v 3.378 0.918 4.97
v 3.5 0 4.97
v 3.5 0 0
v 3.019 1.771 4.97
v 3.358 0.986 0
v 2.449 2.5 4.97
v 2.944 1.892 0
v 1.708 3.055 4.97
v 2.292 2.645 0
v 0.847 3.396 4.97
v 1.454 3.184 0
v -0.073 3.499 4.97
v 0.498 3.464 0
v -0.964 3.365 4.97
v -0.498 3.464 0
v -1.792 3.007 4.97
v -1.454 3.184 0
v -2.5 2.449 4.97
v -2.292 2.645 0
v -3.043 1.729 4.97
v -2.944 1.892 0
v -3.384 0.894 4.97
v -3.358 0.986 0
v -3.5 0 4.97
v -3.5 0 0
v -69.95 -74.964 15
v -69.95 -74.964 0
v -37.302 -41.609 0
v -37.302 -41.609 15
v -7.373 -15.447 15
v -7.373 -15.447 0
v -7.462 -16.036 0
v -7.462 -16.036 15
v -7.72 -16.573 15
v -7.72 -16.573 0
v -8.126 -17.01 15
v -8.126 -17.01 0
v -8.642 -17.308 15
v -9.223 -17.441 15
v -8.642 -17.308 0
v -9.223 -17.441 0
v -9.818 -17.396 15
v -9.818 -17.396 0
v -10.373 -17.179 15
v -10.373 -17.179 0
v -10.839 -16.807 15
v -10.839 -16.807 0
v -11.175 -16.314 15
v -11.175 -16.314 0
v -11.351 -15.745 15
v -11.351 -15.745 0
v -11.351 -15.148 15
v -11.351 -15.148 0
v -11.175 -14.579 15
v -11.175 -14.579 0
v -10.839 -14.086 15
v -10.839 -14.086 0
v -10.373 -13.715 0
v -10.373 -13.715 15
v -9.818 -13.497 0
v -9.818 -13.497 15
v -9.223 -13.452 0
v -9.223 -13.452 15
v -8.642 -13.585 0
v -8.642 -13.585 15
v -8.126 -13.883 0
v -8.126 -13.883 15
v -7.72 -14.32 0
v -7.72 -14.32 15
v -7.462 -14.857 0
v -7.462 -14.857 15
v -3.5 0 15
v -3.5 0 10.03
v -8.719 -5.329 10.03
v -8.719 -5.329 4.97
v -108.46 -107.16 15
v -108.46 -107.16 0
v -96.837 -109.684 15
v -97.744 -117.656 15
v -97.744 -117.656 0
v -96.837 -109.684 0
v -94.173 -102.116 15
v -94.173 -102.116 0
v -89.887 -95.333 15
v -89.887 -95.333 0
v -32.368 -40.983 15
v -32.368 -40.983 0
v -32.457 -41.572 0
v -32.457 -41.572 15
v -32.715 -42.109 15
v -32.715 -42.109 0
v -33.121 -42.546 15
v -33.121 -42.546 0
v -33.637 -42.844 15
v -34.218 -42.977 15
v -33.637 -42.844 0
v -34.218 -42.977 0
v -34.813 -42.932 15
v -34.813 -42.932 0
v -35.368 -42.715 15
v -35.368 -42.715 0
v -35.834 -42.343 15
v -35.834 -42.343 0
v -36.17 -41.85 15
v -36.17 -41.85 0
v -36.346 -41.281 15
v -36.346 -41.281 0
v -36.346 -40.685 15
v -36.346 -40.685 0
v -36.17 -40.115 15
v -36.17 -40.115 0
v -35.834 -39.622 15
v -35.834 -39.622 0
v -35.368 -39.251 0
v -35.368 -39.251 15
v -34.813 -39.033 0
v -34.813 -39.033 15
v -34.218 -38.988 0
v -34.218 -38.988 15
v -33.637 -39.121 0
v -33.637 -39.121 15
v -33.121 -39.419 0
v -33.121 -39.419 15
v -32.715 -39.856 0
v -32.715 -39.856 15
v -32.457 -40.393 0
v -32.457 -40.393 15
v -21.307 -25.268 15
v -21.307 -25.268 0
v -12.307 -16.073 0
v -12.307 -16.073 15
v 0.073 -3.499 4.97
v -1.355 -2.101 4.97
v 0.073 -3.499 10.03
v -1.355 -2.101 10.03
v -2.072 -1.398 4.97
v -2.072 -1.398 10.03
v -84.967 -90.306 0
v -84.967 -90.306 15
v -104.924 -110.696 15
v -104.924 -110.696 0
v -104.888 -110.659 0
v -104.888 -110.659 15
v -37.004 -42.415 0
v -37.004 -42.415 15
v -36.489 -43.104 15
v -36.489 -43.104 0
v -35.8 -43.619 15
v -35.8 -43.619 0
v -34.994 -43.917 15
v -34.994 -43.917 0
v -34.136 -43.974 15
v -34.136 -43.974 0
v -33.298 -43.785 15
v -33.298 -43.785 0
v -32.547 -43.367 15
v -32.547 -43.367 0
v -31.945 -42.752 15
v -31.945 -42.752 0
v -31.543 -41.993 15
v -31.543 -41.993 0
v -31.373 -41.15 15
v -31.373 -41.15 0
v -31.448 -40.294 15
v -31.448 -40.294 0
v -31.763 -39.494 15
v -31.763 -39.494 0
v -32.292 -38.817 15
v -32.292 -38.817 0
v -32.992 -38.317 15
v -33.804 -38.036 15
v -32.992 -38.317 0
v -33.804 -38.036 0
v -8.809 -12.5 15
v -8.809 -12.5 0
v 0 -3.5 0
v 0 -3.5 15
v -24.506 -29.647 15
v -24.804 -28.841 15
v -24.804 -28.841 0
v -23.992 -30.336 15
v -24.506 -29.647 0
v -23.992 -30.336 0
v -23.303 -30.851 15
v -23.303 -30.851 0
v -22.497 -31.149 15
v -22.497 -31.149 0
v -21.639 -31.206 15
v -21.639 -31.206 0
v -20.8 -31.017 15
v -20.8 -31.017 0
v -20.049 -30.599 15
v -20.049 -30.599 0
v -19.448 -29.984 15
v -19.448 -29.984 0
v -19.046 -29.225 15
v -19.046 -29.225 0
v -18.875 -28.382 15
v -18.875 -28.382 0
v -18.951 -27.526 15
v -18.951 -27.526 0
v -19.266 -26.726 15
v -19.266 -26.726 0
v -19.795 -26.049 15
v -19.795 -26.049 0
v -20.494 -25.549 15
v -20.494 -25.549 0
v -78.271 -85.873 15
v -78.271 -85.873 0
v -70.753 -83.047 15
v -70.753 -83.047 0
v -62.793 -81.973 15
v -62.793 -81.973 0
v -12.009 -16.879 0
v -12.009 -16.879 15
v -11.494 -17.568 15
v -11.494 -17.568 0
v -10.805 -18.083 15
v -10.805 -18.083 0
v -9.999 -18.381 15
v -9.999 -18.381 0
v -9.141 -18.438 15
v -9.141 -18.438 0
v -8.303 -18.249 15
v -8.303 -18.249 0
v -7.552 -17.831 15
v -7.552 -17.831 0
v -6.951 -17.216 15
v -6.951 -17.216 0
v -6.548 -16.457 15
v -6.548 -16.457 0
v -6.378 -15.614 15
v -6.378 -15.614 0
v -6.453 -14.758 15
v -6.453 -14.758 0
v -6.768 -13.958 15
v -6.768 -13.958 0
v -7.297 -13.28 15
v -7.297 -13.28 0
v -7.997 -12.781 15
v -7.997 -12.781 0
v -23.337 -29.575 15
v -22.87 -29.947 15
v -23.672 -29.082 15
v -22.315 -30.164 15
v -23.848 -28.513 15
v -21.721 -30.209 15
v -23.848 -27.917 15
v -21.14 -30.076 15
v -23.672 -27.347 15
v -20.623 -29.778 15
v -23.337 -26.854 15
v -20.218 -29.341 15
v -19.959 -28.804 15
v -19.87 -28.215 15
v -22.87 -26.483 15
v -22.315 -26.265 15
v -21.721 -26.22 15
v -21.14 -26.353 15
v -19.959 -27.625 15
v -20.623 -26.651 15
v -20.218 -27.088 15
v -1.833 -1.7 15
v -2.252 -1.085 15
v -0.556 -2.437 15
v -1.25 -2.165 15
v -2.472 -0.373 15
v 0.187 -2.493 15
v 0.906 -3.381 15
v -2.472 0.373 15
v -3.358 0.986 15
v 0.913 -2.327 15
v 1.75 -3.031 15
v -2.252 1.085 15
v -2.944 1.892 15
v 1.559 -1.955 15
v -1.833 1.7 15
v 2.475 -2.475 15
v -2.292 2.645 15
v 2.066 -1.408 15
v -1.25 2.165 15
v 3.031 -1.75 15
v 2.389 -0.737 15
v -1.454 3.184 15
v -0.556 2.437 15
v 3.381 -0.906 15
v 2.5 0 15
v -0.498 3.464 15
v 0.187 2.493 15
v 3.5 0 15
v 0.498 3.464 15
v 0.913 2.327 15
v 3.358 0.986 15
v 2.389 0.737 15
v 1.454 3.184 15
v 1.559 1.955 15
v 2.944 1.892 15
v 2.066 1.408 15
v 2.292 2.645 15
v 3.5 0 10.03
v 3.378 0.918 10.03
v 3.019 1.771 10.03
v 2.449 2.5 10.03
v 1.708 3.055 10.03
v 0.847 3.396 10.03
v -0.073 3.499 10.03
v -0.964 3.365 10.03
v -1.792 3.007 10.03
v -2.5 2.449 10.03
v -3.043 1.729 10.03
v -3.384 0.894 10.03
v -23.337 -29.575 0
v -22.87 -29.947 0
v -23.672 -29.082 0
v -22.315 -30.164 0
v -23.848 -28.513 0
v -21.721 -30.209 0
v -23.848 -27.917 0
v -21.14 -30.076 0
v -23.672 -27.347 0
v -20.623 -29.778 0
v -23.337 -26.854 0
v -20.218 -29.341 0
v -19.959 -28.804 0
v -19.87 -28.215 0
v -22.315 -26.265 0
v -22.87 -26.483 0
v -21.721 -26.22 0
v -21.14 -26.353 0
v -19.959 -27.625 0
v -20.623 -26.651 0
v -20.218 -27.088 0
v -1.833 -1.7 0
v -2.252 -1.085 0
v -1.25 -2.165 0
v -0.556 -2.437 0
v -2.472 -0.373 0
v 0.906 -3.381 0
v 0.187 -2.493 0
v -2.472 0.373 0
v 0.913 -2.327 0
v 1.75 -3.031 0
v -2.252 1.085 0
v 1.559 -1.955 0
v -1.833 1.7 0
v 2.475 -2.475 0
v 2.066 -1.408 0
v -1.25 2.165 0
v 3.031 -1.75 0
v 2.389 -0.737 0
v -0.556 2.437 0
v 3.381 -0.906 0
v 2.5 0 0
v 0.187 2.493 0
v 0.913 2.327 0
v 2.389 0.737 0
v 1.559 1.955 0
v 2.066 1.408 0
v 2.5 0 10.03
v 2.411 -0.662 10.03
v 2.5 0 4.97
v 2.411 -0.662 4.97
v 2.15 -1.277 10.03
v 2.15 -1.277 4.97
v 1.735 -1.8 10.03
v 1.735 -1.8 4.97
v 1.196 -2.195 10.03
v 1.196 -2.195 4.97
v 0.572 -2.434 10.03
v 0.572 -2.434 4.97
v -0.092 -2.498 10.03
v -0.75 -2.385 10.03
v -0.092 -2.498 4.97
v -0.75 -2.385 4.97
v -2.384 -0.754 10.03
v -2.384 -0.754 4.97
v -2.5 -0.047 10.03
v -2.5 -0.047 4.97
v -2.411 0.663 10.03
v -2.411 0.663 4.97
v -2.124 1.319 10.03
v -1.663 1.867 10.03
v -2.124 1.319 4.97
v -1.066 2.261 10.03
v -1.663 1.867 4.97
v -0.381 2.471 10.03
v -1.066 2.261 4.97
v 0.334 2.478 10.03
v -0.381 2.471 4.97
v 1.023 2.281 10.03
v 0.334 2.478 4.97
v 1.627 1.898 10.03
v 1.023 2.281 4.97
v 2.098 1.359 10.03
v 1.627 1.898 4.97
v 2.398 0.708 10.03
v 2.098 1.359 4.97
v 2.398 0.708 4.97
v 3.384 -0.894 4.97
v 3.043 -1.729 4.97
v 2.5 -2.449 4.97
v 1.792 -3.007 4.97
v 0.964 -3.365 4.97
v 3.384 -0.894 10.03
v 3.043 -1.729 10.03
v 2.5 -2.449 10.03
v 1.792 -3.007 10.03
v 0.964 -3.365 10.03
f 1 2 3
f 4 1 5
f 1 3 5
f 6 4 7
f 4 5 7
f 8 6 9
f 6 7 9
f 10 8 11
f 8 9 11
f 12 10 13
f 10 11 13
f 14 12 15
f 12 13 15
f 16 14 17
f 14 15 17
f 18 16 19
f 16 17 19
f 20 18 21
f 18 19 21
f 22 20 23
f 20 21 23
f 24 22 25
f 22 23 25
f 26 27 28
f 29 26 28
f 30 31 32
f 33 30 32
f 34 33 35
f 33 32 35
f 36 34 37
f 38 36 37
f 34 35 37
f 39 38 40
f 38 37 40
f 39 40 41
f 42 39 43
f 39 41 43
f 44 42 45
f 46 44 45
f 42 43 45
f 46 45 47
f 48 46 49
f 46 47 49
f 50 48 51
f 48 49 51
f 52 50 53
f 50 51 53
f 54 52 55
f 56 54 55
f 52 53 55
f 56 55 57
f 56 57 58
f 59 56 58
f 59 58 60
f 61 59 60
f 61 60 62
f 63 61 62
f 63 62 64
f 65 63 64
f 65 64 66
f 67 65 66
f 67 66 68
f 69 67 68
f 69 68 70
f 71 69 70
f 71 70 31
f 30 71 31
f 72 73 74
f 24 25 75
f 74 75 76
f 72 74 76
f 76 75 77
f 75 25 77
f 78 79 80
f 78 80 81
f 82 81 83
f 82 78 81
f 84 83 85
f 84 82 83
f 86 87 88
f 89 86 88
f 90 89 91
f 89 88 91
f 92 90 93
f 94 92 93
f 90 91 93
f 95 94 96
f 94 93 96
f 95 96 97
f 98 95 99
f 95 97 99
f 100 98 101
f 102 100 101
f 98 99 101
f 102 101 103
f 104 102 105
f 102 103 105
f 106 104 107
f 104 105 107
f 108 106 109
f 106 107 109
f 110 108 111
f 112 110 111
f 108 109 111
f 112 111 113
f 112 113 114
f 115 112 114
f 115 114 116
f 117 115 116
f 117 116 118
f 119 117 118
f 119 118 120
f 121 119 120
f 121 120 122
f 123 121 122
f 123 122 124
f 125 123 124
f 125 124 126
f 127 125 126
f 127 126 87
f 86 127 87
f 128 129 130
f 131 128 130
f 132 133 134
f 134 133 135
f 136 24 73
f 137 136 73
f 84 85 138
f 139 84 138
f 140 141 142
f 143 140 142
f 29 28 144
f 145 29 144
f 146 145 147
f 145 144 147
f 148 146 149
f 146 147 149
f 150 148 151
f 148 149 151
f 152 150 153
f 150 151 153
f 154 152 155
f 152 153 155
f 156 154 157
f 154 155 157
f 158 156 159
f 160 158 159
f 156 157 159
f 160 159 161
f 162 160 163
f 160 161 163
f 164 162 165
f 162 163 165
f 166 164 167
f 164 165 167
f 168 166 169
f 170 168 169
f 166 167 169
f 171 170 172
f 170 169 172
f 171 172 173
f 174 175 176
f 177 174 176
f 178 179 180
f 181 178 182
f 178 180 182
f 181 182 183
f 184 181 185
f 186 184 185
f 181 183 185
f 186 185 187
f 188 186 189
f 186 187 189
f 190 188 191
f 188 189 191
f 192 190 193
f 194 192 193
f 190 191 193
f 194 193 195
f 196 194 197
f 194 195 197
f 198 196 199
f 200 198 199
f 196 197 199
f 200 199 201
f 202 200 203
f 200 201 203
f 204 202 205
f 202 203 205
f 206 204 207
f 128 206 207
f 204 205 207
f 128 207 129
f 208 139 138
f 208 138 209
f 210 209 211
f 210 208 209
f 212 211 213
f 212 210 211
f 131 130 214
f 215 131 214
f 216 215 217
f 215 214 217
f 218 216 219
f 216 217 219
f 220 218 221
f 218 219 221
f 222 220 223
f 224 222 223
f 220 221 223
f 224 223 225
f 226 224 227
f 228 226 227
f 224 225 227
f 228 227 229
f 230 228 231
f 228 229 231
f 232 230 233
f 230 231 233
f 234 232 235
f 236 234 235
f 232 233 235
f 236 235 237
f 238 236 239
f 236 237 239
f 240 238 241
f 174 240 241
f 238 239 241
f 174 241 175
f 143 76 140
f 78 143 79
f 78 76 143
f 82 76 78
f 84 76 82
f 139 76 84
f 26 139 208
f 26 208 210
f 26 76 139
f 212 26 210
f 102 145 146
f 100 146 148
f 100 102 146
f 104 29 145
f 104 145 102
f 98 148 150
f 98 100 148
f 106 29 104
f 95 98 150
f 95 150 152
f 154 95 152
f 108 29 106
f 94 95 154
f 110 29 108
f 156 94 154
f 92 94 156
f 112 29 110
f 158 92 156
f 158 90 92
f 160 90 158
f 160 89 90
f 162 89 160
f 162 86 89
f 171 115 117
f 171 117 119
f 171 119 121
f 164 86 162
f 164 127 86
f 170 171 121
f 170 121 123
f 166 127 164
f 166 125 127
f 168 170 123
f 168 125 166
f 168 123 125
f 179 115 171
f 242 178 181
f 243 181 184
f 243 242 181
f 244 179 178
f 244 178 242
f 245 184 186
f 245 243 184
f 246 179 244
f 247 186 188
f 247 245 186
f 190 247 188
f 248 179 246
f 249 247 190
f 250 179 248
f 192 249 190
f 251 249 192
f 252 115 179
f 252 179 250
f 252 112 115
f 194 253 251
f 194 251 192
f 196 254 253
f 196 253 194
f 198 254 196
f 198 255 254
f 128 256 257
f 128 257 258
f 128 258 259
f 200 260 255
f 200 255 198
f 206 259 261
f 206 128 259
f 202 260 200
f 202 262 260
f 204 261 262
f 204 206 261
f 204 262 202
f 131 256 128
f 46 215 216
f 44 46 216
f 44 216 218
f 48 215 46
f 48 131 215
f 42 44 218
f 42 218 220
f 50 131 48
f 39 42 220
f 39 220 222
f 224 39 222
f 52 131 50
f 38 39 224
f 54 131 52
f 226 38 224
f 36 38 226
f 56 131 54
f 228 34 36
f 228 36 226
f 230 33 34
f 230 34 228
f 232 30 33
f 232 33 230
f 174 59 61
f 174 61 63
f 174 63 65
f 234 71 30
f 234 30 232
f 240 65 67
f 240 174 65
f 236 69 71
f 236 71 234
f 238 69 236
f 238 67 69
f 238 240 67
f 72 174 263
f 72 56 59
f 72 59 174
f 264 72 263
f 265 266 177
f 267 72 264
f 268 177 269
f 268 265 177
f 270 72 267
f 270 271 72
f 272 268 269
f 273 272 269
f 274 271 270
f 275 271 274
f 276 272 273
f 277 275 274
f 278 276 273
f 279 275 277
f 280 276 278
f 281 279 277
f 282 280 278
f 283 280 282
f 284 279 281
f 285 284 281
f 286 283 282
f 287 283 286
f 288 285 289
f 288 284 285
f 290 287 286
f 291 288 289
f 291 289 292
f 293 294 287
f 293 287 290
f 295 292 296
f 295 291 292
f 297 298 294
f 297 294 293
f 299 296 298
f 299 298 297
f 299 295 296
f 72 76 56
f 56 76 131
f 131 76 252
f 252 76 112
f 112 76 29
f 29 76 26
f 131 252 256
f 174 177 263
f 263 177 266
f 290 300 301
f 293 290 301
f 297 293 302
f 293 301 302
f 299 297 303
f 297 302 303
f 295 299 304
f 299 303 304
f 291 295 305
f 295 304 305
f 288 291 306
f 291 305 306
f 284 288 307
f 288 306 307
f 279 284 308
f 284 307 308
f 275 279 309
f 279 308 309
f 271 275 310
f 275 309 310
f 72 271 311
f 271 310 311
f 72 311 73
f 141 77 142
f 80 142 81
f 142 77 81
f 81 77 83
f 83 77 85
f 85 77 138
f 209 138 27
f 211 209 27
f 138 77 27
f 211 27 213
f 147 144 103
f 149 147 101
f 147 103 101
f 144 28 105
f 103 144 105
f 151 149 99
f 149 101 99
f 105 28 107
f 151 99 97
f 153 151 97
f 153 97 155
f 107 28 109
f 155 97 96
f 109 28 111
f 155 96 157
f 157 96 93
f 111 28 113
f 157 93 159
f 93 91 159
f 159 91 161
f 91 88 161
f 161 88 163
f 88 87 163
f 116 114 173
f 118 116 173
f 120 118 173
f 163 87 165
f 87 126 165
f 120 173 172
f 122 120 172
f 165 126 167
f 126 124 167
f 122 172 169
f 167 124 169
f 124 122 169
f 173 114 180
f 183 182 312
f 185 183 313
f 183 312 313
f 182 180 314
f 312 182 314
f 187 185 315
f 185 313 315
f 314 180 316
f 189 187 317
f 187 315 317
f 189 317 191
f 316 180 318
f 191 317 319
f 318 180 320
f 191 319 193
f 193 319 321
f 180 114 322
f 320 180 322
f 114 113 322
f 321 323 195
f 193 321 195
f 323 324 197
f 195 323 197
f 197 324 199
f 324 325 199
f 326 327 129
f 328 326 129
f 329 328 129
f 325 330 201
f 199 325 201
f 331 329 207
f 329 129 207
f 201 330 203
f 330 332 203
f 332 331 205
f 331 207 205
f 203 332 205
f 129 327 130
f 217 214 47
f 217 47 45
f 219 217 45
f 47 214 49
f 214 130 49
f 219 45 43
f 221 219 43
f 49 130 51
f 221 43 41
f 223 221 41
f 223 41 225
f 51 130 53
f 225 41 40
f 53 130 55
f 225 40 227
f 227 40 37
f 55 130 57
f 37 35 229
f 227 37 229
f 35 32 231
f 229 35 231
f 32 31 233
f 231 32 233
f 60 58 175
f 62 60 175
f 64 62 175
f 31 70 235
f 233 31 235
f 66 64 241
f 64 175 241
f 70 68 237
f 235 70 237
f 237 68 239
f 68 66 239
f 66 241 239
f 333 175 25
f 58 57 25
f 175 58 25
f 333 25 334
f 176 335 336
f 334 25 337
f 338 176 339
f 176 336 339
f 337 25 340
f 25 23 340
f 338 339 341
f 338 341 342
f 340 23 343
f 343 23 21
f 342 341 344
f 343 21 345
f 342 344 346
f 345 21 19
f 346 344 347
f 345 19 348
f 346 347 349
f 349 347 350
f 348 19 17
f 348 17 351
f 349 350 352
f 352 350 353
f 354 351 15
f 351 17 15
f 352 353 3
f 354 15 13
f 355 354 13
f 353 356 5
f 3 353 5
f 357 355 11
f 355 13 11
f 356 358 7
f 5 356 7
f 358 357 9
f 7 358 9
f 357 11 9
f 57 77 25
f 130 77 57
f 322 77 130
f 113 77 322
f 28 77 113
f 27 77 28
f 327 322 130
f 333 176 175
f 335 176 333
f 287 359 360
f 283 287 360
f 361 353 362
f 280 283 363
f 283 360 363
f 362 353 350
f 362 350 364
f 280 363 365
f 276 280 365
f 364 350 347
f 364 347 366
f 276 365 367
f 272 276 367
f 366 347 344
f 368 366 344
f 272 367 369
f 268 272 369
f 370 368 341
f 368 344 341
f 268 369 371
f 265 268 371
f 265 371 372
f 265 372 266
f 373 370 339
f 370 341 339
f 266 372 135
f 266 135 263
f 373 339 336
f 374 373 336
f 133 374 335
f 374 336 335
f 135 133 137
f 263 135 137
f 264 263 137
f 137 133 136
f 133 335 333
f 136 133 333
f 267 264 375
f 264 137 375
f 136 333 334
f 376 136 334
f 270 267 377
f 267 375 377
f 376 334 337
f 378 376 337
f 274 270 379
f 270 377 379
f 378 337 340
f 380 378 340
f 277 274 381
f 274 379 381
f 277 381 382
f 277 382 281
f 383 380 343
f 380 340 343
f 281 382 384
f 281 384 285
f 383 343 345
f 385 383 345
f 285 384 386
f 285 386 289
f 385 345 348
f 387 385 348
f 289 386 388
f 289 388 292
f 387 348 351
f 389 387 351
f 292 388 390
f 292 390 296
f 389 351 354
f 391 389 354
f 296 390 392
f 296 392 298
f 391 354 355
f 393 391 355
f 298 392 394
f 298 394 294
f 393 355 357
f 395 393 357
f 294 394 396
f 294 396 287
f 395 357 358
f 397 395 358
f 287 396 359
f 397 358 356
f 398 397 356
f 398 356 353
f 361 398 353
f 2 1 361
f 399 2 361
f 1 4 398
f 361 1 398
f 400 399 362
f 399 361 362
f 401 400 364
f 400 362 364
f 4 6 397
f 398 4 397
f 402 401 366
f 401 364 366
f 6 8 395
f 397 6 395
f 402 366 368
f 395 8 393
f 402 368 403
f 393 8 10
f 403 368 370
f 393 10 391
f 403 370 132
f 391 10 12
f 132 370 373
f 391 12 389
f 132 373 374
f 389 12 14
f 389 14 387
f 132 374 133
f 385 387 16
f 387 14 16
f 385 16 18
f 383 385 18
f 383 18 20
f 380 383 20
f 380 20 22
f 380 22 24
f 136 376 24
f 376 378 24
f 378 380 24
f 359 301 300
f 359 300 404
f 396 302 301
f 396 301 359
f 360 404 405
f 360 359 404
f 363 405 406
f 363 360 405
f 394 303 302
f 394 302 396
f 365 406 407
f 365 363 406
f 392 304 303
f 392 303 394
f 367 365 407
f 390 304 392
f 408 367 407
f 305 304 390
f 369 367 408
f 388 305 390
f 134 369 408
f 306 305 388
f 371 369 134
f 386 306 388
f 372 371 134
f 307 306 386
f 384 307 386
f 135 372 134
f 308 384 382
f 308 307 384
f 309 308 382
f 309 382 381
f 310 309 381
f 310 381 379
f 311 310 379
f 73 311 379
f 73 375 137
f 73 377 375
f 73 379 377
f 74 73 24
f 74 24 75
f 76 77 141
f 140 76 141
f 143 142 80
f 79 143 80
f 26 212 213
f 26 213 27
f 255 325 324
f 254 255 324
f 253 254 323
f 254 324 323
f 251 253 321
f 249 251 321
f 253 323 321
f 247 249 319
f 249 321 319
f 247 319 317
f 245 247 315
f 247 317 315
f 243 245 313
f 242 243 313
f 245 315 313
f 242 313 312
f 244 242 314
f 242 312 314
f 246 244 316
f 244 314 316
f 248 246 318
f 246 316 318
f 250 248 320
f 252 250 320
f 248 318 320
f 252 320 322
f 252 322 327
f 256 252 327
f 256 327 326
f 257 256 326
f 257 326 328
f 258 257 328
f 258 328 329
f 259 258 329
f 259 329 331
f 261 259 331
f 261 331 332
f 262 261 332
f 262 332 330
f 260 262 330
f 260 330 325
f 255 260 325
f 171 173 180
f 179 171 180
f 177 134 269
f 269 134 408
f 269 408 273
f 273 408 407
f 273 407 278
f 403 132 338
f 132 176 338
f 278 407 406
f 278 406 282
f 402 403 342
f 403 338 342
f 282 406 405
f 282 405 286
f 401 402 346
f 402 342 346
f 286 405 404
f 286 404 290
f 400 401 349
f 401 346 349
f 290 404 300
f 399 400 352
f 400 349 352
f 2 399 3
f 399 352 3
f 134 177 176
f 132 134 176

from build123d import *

# Parameters (mm, degrees)
F1_DEPTH  = 15
F2_DEPTH  = 15
F3_W      = 7.4589547733
F3_H      = 5.06
F4_DEPTH  = 25
F5_W      = 8.8782840291
F5_H      = 5.06
F6_DEPTH  = 25
F7_W      = 4.8981418308
F7_H      = 5.06
F8_DEPTH  = 25
F9_DEPTH  = 25
F10_DEPTH = 25
F11_R     = 2.5
F12_DEPTH = 25
F14_DEPTH = 15
F11_R_2   = 2
F15_DEPTH = 25


with BuildPart() as f1:
    # F0 (on Top) → F1 (new body)
    with BuildSketch(Plane.XY):
        with BuildLine():
            ThreePointArc((0, -3.5), (2.4748737342, -2.4748737342), (3.5, 0))
            ThreePointArc((3.5, 0), (0, 3.5), (-3.5, 0))
            ThreePointArc((-3.5, 0), (-2.4748737342, -2.4748737342), (0, -3.5))
        make_face()
    extrude(amount=F1_DEPTH)

    # F0 (on Top) → F2 (join)
    with BuildSketch(Plane.XY):
        with BuildLine():
            ThreePointArc((0, -3.5), (2.4748737342, -2.4748737342), (3.5, 0))
            ThreePointArc((3.5, 0), (0, 3.5), (-3.5, 0))
            ThreePointArc((-3.5, 0), (-2.4748737342, -2.4748737342), (0, -3.5))
        make_face()
        with BuildLine():
            ThreePointArc((0, -3.5), (-2.4748737342, -2.4748737342), (-3.5, 0))
            Line((-3.5, 0), (-108.4601820875, -107.1604412839))
            Line((-108.4601820875, -107.1604412839), (-104.9242736666, -110.6956006351))
            Line((-104.9242736666, -110.6956006351), (-37.3017297765, -41.6092114188))
            Line((-37.3017297765, -41.6092114188), (-33.8042539876, -38.0360247309))
            Line((-33.8042539876, -38.0360247309), (-24.8042539876, -28.8411990533))
            Line((-24.8042539876, -28.8411990533), (-21.3067781987, -25.2680123655))
            Line((-21.3067781987, -25.2680123655), (-12.3067781987, -16.0731866878))
            Line((-12.3067781987, -16.0731866878), (-8.8093024098, -12.5))
            Line((-8.8093024098, -12.5), (0, -3.5))
        make_face()
        with BuildLine():
            ThreePointArc((-12.3067781987, -16.0731866878), (-7.2290363366, -17.5450603078), (-8.8093024098, -12.5))
            Line((-8.8093024098, -12.5), (-12.3067781987, -16.0731866878))
        make_face()
        with BuildLine():
            Line((-33.8042539876, -38.0360247309), (-37.3017297765, -41.6092114188))
            ThreePointArc((-37.3017297765, -41.6092114188), (-32.2239879144, -43.0810850387), (-33.8042539876, -38.0360247309))
        make_face()
        with BuildLine():
            ThreePointArc((-24.8042539876, -28.8411990533), (-19.7265121255, -30.3130726732), (-21.3067781987, -25.2680123655))
            Line((-21.3067781987, -25.2680123655), (-24.8042539876, -28.8411990533))
        make_face()
    extrude(amount=F2_DEPTH)

    # F3 (on face) → F4 (join)
    with BuildSketch(Plane(origin=(-1.7863004718, 1.7496234668, 0), x_dir=(-0.6997345473, -0.7144029419, 0), z_dir=(-0.7144029419, 0.6997345473, 0))):
        with Locations((6.178548302, 7.5)):
            Rectangle(F3_W, F3_H)
    extrude(amount=F4_DEPTH)

    # F5 (on face) → F6 (cut)
    with BuildSketch(Plane(origin=(-1.7136995282, -1.7496234668, 0), x_dir=(-0.7144029419, 0.6997345473, 0), z_dir=(0.6997345473, 0.7144029419, 0))):
        with Locations((6.9395523112, 7.5)):
            Rectangle(F5_W, F5_H)
    extrude(amount=F6_DEPTH, mode=Mode.SUBTRACT)

    # F7 (on face) → F8 (cut)
    with BuildSketch(Plane(origin=(-1.7863004718, 1.7496234668, 0), x_dir=(-0.6997345473, -0.7144029419, 0), z_dir=(-0.7144029419, 0.6997345473, 0))):
        with Locations((0, 7.5)):
            Rectangle(F7_W, F7_H)
    extrude(amount=-F8_DEPTH, mode=Mode.SUBTRACT)

    # F9 (cut): a face of the model
    f9_faces = [f1.faces().sort_by_distance(p)[0] for p in [
        (1.7136995282, 1.7496234668, 7.5),
    ]]
    extrude(f9_faces, amount=-F9_DEPTH, mode=Mode.SUBTRACT)

    # F10 (cut): a face of the model
    f10_faces = [f1.faces().sort_by_distance(p)[0] for p in [
        (-23.9697177179, 14.8290140645, 7.5),
    ]]
    extrude(f10_faces, amount=-F10_DEPTH, mode=Mode.SUBTRACT)

    # F11 (on face) → F12 (cut)
    with BuildSketch(Plane(origin=(0, 0, 0), x_dir=(1, 0, 0), z_dir=(0, 0, -1))):
        Circle(F11_R)
    extrude(amount=-F12_DEPTH, mode=Mode.SUBTRACT)

    # F13 (on face) → F14 (join)
    with BuildSketch(Plane.XY.offset(15)):
        with BuildLine():
            Line((-89.8873776378, -95.3331964442), (-104.8883679048, -110.6589176106))
            Line((-104.8883679048, -110.6589176106), (-97.7441379591, -117.6564594926))
            ThreePointArc((-97.7441379591, -117.6564594926), (-95.7182525009, -105.8252374674), (-89.8873776378, -95.3331964442))
        make_face()
        with BuildLine():
            Line((-62.7933306081, -81.9729853935), (-69.9495157778, -74.9637337568))
            Line((-69.9495157778, -74.9637337568), (-84.9671665368, -90.3064760697))
            ThreePointArc((-84.9671665368, -90.3064760697), (-74.5911866059, -84.2480596514), (-62.7933306081, -81.9729853935))
        make_face()
    extrude(amount=-F14_DEPTH)

    # F11 (on face) → F15 (cut)
    with BuildSketch(Plane(origin=(0, 0, 0), x_dir=(1, 0, 0), z_dir=(0, 0, -1))):
        Circle(F11_R)
        with Locations((-34.3678999271, 40.9825995654)):
            Circle(F11_R_2)
        with Locations((-21.8704241382, 28.2145871999)):
            Circle(F11_R_2)
        with Locations((-9.3729483493, 15.4465748344)):
            Circle(F11_R_2)
    extrude(amount=-F15_DEPTH, mode=Mode.SUBTRACT)


solid = f1.part
